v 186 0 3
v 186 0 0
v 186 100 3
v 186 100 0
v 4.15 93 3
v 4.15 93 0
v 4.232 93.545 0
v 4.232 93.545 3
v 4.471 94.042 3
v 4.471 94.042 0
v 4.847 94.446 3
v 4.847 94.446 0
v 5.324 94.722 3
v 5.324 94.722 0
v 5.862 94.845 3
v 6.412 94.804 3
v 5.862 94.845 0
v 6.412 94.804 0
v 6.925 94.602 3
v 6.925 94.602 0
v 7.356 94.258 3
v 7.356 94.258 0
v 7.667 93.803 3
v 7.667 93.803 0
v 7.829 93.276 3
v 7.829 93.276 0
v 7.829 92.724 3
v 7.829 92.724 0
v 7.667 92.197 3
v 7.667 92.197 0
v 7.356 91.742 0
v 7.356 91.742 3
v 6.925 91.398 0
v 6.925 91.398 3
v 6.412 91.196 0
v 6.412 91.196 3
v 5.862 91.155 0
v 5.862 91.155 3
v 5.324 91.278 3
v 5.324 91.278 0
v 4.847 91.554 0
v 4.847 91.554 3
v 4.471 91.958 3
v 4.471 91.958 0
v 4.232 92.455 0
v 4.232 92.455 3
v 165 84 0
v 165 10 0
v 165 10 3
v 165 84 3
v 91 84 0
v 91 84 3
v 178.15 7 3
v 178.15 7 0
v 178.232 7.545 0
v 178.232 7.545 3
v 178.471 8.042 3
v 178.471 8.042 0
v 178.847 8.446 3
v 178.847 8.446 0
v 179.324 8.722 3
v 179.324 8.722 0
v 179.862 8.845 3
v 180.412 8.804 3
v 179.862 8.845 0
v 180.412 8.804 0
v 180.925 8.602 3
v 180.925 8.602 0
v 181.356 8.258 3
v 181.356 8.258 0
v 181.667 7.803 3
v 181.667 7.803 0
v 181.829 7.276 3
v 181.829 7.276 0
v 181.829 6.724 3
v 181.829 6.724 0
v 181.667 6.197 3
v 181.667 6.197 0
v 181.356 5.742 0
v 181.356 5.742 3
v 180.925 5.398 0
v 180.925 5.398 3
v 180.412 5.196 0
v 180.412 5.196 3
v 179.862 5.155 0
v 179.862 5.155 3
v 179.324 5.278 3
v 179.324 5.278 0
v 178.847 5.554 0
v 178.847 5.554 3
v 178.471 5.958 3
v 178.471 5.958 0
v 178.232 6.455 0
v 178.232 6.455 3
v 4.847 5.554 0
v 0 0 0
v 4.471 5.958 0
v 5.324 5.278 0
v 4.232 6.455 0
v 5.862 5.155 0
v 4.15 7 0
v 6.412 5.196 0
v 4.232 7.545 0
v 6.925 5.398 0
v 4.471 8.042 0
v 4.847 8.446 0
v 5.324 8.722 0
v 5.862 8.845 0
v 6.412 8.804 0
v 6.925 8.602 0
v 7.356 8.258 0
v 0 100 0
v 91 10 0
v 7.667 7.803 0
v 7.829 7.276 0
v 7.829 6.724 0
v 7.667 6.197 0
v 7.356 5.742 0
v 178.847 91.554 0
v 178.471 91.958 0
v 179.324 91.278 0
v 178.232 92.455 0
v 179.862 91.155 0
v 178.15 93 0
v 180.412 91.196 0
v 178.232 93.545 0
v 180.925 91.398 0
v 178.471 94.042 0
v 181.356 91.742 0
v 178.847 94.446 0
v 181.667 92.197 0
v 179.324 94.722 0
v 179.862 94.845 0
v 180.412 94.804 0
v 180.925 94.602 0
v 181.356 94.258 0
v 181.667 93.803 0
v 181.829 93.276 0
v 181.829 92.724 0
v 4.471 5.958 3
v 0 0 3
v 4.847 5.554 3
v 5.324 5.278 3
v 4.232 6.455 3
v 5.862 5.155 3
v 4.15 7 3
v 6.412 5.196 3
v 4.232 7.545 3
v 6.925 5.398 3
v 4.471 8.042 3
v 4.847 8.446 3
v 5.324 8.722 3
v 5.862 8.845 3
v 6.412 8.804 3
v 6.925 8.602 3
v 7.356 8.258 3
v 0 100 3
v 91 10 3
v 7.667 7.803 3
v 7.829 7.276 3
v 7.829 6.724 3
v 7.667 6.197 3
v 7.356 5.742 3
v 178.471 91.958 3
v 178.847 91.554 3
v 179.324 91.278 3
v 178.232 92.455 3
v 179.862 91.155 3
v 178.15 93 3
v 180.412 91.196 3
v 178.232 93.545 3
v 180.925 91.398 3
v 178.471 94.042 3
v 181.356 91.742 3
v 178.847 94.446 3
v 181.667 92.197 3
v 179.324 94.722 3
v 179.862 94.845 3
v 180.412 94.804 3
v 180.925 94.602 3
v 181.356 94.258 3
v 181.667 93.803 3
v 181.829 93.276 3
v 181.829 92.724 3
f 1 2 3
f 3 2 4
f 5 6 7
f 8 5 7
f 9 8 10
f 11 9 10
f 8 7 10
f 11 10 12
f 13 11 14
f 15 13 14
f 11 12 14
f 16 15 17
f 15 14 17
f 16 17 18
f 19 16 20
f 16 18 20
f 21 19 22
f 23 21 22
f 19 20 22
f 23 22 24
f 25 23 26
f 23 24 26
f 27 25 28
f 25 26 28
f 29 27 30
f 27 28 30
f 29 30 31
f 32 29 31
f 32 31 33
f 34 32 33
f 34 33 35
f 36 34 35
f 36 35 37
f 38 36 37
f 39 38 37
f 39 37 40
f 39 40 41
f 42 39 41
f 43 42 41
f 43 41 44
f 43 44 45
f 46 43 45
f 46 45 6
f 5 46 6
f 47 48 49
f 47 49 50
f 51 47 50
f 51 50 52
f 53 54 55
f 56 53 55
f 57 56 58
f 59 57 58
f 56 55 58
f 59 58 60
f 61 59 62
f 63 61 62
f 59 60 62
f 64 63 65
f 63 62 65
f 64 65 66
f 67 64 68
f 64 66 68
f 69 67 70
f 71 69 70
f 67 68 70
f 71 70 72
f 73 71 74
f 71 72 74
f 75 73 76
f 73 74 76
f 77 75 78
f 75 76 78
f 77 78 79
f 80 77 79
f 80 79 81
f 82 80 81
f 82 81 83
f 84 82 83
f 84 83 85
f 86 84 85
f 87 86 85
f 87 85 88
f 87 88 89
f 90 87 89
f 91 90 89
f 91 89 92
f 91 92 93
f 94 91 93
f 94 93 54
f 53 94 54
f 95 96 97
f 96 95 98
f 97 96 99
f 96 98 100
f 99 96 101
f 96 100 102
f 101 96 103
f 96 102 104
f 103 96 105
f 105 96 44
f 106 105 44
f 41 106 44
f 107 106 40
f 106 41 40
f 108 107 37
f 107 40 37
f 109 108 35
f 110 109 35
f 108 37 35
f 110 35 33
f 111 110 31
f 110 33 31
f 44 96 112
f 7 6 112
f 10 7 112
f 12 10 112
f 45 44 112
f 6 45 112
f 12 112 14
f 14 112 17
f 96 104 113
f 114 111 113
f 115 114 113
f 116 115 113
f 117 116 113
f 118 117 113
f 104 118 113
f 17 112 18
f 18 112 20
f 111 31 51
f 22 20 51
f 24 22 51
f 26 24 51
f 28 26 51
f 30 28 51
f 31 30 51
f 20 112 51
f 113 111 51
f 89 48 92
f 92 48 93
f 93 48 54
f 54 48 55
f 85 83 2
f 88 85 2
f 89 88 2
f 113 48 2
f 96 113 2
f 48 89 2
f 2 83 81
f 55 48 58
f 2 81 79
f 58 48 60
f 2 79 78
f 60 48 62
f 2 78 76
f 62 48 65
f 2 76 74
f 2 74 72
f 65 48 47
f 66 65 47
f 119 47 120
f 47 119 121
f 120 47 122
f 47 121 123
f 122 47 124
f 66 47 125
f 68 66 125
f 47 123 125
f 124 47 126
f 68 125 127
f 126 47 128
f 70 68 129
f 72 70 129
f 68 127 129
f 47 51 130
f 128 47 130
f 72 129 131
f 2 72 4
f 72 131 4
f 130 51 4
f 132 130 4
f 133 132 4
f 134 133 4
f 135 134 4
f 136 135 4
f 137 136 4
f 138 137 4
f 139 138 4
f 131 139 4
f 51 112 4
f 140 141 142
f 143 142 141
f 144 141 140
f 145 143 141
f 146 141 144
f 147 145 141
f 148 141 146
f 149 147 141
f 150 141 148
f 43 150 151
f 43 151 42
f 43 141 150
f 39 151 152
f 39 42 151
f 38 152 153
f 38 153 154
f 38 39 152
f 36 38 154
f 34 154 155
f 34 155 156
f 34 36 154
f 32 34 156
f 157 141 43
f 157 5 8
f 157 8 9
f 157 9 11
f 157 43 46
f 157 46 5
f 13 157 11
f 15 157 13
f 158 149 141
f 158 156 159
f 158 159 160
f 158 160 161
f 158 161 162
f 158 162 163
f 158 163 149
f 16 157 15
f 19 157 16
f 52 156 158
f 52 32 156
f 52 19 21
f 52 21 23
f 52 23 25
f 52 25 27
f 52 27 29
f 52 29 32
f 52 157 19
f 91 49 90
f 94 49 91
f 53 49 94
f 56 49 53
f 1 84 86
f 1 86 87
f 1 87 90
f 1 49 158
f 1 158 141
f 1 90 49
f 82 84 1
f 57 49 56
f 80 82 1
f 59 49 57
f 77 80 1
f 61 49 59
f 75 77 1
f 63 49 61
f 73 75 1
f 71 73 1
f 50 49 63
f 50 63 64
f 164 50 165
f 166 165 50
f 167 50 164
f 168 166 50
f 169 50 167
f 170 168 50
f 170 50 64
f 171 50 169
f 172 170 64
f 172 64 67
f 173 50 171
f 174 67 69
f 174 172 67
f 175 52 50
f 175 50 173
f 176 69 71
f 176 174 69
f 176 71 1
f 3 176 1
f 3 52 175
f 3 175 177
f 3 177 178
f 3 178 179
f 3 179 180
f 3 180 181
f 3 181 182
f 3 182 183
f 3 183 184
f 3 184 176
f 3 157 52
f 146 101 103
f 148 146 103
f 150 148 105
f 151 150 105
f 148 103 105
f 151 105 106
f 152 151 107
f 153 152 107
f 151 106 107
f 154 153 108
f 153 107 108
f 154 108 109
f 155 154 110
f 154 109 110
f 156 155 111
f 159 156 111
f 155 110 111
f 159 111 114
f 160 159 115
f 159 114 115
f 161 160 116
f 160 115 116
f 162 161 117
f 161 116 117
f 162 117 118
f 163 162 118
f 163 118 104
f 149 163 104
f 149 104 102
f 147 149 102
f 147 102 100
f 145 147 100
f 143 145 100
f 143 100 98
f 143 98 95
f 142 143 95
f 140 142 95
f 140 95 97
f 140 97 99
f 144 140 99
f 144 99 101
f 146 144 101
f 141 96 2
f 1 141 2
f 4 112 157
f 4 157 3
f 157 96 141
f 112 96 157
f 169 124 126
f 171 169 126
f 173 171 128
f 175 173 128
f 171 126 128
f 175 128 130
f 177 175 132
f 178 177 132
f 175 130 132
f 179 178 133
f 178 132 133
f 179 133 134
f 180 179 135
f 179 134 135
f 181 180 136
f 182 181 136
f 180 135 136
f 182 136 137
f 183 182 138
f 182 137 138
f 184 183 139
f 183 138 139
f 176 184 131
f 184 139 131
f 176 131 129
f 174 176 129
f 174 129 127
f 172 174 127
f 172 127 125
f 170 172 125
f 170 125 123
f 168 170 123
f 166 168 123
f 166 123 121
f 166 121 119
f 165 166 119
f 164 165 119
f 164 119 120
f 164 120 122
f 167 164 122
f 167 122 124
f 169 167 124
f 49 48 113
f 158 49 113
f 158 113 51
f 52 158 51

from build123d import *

# Parameters (mm, degrees)
SKETCH1_W           = 186
SKETCH1_H           = 100
BOSS_EXTRUDE1_DEPTH = 3
SKETCH2_W           = 74
SKETCH2_H           = 74
SKETCH2_R           = 1.85
CUT_EXTRUDE1_DEPTH  = 4


with BuildPart() as part:
    # Sketch1 → Boss-Extrude1 (new body)
    with BuildSketch(Plane.XY):
        with Locations((93, 50)):
            Rectangle(SKETCH1_W, SKETCH1_H)
    extrude(amount=BOSS_EXTRUDE1_DEPTH)

    # Sketch2 → Cut-Extrude1 (cut, through all)
    with BuildSketch(Plane(origin=(0, 0, 0), x_dir=(-1, 0, 0), z_dir=(0, 0, -1))):
        with Locations((-128, 47)):
            Rectangle(SKETCH2_W, SKETCH2_H)
        with Locations((-180, 7)):
            Circle(SKETCH2_R)
        with Locations((-180, 93)):
            Circle(SKETCH2_R)
        with Locations((-6, 7)):
            Circle(SKETCH2_R)
        with Locations((-6, 93)):
            Circle(SKETCH2_R)
    extrude(amount=-CUT_EXTRUDE1_DEPTH, mode=Mode.SUBTRACT)


solid = part.part
